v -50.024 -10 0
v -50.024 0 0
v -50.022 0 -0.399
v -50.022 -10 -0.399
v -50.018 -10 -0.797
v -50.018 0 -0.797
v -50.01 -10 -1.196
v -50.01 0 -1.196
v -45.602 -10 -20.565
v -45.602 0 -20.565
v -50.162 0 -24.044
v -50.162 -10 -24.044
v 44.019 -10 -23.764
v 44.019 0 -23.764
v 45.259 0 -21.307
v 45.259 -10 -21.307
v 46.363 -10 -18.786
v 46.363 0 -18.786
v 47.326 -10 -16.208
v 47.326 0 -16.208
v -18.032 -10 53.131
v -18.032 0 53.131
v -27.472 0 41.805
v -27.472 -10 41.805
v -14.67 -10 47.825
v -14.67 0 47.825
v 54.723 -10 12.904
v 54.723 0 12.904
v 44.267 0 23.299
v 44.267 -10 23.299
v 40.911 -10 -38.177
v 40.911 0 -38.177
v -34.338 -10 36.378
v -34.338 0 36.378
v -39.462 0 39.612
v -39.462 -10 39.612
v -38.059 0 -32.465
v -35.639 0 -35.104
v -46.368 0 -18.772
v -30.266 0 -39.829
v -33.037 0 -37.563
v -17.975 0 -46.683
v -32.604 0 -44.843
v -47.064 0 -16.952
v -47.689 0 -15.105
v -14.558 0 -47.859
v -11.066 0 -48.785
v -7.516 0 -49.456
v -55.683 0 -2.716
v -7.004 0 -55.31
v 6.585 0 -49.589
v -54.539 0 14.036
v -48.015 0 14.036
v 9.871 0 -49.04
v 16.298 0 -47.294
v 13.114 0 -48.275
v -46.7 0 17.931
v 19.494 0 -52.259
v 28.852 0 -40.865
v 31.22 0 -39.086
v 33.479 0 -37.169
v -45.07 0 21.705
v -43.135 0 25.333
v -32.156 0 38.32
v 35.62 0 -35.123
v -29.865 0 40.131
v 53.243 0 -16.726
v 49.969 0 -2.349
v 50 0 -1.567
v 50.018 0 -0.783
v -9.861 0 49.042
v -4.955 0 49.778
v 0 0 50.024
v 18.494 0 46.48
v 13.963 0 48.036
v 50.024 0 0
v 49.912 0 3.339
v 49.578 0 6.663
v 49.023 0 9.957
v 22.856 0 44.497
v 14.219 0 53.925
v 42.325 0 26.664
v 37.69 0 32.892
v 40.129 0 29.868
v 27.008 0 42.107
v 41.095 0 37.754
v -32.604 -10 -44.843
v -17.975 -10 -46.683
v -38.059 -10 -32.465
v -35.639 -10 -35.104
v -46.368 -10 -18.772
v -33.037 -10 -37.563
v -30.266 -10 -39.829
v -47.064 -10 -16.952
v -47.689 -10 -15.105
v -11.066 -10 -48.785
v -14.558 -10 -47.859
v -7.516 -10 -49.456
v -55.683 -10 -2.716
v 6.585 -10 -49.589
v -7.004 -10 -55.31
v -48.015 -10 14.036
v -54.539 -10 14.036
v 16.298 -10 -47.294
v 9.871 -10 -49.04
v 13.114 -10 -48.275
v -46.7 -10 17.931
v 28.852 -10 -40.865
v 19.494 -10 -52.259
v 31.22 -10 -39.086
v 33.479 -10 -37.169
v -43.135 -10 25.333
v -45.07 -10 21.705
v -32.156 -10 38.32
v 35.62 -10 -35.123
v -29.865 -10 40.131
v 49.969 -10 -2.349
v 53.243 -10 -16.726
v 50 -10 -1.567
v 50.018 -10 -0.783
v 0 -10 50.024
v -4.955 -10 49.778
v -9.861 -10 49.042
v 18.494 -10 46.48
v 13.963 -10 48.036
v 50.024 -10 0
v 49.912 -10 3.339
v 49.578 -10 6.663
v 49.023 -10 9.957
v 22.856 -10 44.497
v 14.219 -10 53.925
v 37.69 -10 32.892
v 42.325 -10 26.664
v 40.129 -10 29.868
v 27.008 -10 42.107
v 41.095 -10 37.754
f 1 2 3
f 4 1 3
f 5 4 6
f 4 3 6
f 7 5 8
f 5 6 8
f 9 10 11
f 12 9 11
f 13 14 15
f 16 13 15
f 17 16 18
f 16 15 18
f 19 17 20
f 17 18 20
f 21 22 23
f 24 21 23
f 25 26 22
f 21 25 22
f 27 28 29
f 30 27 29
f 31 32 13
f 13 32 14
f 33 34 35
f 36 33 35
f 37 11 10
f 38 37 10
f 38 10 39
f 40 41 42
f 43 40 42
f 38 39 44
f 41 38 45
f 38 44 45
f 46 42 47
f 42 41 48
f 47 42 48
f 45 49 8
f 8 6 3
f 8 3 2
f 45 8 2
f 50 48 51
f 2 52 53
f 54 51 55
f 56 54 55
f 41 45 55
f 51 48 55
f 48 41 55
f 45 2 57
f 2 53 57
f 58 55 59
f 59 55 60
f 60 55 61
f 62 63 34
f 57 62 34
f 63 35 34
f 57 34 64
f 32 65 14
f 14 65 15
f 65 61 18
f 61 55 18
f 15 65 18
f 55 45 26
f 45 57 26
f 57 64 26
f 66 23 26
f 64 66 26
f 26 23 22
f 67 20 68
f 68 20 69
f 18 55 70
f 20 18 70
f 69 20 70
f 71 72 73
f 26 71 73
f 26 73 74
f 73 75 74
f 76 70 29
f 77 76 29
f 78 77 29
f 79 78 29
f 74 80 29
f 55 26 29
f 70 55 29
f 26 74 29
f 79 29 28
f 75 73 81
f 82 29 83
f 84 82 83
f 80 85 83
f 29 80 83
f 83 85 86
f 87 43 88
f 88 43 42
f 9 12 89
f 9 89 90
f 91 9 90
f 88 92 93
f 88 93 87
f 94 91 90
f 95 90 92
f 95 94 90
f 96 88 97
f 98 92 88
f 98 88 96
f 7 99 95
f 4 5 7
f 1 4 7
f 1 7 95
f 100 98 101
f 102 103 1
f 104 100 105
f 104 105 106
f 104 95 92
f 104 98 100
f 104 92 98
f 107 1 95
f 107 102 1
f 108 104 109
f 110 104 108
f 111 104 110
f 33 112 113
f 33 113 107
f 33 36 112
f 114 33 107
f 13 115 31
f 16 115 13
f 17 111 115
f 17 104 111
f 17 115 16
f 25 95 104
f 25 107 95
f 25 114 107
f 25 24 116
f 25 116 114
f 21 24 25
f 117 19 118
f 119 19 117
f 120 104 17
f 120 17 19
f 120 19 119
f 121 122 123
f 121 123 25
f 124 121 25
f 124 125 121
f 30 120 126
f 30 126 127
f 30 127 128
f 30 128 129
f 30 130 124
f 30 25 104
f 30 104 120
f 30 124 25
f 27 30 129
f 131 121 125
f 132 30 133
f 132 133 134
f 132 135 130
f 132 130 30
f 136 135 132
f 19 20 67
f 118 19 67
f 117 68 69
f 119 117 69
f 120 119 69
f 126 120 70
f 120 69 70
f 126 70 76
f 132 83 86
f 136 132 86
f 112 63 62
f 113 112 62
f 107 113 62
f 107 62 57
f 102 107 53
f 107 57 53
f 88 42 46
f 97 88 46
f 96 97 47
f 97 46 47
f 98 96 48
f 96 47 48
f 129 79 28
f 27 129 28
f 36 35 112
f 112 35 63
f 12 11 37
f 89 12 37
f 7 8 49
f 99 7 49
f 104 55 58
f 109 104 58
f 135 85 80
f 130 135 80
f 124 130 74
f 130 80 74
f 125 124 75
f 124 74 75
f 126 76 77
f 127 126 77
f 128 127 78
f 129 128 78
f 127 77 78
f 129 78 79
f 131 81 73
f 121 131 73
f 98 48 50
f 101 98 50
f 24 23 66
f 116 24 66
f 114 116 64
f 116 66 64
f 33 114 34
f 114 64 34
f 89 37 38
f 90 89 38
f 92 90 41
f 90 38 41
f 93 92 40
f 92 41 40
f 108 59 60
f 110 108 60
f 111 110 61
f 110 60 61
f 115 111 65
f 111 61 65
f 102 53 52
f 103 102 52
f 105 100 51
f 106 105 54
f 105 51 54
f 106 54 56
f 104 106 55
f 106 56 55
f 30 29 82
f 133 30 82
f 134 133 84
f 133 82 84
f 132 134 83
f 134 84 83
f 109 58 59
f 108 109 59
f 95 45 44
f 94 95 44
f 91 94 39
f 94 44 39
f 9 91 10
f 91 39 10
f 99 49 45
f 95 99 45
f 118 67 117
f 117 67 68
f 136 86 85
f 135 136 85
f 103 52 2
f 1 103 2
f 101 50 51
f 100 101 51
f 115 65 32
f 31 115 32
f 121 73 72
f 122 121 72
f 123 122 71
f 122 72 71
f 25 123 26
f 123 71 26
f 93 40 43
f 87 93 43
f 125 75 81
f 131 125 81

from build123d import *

# Parameters (mm, degrees)
F1_DEPTH = 10


with BuildPart() as f1:
    # F0 (on Front) → F1 (new body)
    with BuildSketch(Plane.XZ):
        with BuildLine():
            ThreePointArc((-34.337593, 36.377659), (-39.128216, 31.167084), (-43.135461, 25.332518))
            ThreePointArc((-43.135461, 25.332518), (-45.923647, 19.834894), (-48.014505, 14.036086))
            ThreePointArc((-48.014505, 14.036086), (-49.519107, 7.089604), (-50.024038, 0))
            ThreePointArc((-50.024038, 0), (-50.020463, -0.5981), (-50.009736, -1.196115))
            ThreePointArc((-50.009736, -1.196115), (-49.341893, -8.232983), (-47.688879, -15.105469))
            ThreePointArc((-47.688879, -15.105469), (-46.725007, -17.865557), (-45.601542, -20.564625))
            ThreePointArc((-45.601542, -20.564625), (-42.251133, -26.781453), (-38.058637, -32.464513))
            ThreePointArc((-38.058637, -32.464513), (-34.360112, -36.35639), (-30.265785, -39.82947))
            ThreePointArc((-30.265785, -39.82947), (-24.362413, -43.6907), (-17.974608, -46.683165))
            ThreePointArc((-17.974608, -46.683165), (-12.820651, -48.353235), (-7.516311, -49.456137))
            ThreePointArc((-7.516311, -49.456137), (-0.470356, -50.021827), (6.584991, -49.588732))
            ThreePointArc((6.584991, -49.588732), (11.499056, -48.684455), (16.298397, -47.294467))
            ThreePointArc((16.298397, -47.294467), (22.803128, -44.524395), (28.852373, -40.864961))
            ThreePointArc((28.852373, -40.864961), (32.363977, -38.144166), (35.620358, -35.122564))
            ThreePointArc((35.620358, -35.122564), (40.222649, -29.741266), (44.019019, -23.764057))
            ThreePointArc((44.019019, -23.764057), (45.828281, -20.054253), (47.32555, -16.207922))
            ThreePointArc((47.32555, -16.207922), (49.138207, -9.372354), (49.968834, -2.349478))
            ThreePointArc((49.968834, -2.349478), (50.010235, -1.175063), (50.024038, 0))
            ThreePointArc((50.024038, 0), (49.77315, 5.003793), (49.023002, 9.957394))
            ThreePointArc((49.023002, 9.957394), (47.119504, 16.797522), (44.266789, 23.299265))
            ThreePointArc((44.266789, 23.299265), (41.258147, 28.287272), (37.690051, 32.891708))
            ThreePointArc((37.690051, 32.891708), (32.67536, 37.877768), (27.007686, 42.10688))
            ThreePointArc((27.007686, 42.10688), (20.698662, 45.540858), (13.962862, 48.03585))
            ThreePointArc((13.962862, 48.03585), (7.051851, 49.524497), (0, 50.024038))
            ThreePointArc((0, 50.024038), (-7.417006, 49.471127), (-14.670053, 47.824616))
            ThreePointArc((-14.670053, 47.824616), (-21.285063, 45.269753), (-27.47235, 41.805196))
            ThreePointArc((-27.47235, 41.805196), (-31.023891, 39.241847), (-34.337593, 36.377659))
        make_face()
        with BuildLine():
            Line((-39.461789, 39.611867), (-43.135461, 25.332518))
            ThreePointArc((-43.135461, 25.332518), (-39.128216, 31.167084), (-34.337593, 36.377659))
            Line((-34.337593, 36.377659), (-39.461789, 39.611867))
        make_face()
        with BuildLine():
            ThreePointArc((-50.024038, 0), (-49.519107, 7.089604), (-48.014505, 14.036086))
            Line((-48.014505, 14.036086), (-54.538898, 14.036086))
            Line((-54.538898, 14.036086), (-50.024038, 0))
        make_face()
        with BuildLine():
            Line((-18.031633, 53.130766), (-27.47235, 41.805196))
            ThreePointArc((-27.47235, 41.805196), (-21.285063, 45.269753), (-14.670053, 47.824616))
            Line((-14.670053, 47.824616), (-18.031633, 53.130766))
        make_face()
        with BuildLine():
            ThreePointArc((-47.688879, -15.105469), (-49.341893, -8.232983), (-50.009736, -1.196115))
            Line((-50.009736, -1.196115), (-55.682706, -2.716183))
            Line((-55.682706, -2.716183), (-47.688879, -15.105469))
        make_face()
        with BuildLine():
            Line((14.219069, 53.924521), (0, 50.024038))
            ThreePointArc((0, 50.024038), (7.051851, 49.524497), (13.962862, 48.03585))
            Line((13.962862, 48.03585), (14.219069, 53.924521))
        make_face()
        with BuildLine():
            ThreePointArc((-38.058637, -32.464513), (-42.251133, -26.781453), (-45.601542, -20.564625))
            Line((-45.601542, -20.564625), (-50.161836, -24.043809))
            Line((-50.161836, -24.043809), (-38.058637, -32.464513))
        make_face()
        with BuildLine():
            Line((41.094992, 37.754468), (27.007686, 42.10688))
            ThreePointArc((27.007686, 42.10688), (32.67536, 37.877768), (37.690051, 32.891708))
            Line((37.690051, 32.891708), (41.094992, 37.754468))
        make_face()
        with BuildLine():
            ThreePointArc((-17.974608, -46.683165), (-24.362413, -43.6907), (-30.265785, -39.82947))
            Line((-30.265785, -39.82947), (-32.603685, -44.843111))
            Line((-32.603685, -44.843111), (-17.974608, -46.683165))
        make_face()
        with BuildLine():
            Line((54.722803, 12.903715), (44.266789, 23.299265))
            ThreePointArc((44.266789, 23.299265), (47.119504, 16.797522), (49.023002, 9.957394))
            Line((49.023002, 9.957394), (54.722803, 12.903715))
        make_face()
        with BuildLine():
            ThreePointArc((6.584991, -49.588732), (-0.470356, -50.021827), (-7.516311, -49.456137))
            Line((-7.516311, -49.456137), (-7.004188, -55.309737))
            Line((-7.004188, -55.309737), (6.584991, -49.588732))
        make_face()
        with BuildLine():
            ThreePointArc((28.852373, -40.864961), (22.803128, -44.524395), (16.298397, -47.294467))
            Line((16.298397, -47.294467), (19.493974, -52.258645))
            Line((19.493974, -52.258645), (28.852373, -40.864961))
        make_face()
        with BuildLine():
            Line((53.243188, -16.725649), (49.968834, -2.349478))
            ThreePointArc((49.968834, -2.349478), (49.138207, -9.372354), (47.32555, -16.207922))
            Line((47.32555, -16.207922), (53.243188, -16.725649))
        make_face()
        with BuildLine():
            ThreePointArc((44.019019, -23.764057), (40.222649, -29.741266), (35.620358, -35.122564))
            Line((35.620358, -35.122564), (40.910959, -38.177094))
            Line((40.910959, -38.177094), (44.019019, -23.764057))
        make_face()
    extrude(amount=F1_DEPTH)


solid = f1.part
